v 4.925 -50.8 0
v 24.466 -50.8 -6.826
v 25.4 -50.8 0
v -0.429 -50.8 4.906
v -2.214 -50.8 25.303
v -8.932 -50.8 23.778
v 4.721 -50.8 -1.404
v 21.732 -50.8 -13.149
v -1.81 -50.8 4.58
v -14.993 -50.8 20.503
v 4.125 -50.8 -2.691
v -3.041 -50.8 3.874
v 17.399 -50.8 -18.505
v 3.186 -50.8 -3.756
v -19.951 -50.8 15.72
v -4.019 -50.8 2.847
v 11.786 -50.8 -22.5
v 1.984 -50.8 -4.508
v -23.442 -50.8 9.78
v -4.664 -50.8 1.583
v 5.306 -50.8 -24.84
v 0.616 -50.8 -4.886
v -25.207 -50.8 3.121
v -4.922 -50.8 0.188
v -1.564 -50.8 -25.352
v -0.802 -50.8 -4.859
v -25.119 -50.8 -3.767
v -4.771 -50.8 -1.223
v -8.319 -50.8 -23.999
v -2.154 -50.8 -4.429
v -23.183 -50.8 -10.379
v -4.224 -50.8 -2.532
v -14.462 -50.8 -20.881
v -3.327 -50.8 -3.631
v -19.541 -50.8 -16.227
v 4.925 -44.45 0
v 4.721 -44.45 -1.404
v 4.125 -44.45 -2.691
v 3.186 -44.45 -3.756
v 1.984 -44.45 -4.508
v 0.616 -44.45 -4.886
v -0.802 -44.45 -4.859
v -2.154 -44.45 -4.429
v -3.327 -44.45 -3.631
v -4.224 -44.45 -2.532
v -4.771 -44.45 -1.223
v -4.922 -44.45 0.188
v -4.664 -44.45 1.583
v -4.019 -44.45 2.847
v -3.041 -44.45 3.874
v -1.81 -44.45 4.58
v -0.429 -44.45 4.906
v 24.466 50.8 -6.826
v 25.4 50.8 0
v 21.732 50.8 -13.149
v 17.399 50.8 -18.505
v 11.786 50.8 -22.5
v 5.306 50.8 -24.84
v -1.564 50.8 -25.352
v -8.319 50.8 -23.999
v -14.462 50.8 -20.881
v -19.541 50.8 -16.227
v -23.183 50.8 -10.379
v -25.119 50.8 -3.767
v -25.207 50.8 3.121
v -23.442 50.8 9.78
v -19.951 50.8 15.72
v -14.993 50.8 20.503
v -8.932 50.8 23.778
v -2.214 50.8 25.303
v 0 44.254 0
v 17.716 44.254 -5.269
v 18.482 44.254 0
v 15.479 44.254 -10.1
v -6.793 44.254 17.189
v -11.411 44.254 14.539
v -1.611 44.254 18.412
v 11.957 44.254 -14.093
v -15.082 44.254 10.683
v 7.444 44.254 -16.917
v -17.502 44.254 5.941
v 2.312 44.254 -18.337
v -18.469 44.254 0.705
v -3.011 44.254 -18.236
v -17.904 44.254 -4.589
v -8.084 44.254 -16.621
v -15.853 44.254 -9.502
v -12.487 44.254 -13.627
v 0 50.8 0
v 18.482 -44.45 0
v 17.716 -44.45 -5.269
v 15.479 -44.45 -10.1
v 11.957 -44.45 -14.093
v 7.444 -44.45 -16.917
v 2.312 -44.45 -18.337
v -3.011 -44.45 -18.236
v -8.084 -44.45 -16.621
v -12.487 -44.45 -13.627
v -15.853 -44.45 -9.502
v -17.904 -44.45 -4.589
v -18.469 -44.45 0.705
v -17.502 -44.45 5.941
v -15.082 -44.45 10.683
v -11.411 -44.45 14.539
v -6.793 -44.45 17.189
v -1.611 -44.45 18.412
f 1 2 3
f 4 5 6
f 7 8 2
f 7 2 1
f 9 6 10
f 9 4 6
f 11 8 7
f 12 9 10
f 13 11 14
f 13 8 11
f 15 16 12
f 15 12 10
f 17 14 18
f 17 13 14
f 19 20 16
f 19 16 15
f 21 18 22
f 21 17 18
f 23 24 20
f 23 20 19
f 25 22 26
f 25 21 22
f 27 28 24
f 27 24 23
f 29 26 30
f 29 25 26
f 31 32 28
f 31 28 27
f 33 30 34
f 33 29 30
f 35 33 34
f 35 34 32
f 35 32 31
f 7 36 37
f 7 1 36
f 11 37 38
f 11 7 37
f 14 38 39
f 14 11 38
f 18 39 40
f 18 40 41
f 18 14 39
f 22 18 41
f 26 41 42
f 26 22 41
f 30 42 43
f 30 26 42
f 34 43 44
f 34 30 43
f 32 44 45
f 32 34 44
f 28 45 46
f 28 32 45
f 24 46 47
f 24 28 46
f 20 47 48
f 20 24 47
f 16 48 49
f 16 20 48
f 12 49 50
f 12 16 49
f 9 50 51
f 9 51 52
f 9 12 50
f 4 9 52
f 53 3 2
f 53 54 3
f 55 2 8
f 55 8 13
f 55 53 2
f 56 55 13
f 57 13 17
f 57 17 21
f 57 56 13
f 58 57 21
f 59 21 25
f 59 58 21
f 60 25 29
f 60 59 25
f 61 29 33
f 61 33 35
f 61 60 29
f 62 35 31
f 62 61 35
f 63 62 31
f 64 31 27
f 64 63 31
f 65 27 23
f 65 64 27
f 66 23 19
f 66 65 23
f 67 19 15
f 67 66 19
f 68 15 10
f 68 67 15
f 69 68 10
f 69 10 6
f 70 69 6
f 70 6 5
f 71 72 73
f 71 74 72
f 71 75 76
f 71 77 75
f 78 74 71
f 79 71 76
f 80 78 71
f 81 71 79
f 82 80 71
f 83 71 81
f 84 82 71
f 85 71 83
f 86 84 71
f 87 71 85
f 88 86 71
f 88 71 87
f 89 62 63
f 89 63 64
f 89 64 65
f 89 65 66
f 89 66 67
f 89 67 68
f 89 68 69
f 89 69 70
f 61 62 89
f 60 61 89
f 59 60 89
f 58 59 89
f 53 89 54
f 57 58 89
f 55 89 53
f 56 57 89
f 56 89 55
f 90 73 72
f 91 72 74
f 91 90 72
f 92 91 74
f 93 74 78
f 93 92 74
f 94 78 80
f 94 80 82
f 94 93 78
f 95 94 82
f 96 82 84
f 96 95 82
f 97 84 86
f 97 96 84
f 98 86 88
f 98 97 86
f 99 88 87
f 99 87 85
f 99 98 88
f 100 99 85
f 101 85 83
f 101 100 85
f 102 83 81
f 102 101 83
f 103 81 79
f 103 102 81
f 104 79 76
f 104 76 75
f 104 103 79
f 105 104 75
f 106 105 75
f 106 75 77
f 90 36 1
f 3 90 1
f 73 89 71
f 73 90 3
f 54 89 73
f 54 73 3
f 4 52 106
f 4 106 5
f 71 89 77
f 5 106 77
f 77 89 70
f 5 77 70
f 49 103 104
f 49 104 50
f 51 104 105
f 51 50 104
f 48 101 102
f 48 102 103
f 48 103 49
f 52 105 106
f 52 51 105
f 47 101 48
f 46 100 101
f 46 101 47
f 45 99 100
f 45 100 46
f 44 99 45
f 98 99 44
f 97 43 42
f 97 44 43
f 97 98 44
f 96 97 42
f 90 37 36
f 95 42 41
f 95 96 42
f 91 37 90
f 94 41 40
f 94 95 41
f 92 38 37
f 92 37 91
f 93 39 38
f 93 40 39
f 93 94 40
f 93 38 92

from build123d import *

# Parameters (mm, degrees)
F1_ANGLE = 265


with BuildPart() as f1:
    # F0 (on Top) → F1 (revolve)
    with BuildSketch(Plane.XY):
        Polygon((25.4, 50.8), (0, 50.8), (0, 44.253774), (18.482406, 44.253774), (18.482406, -44.45), (25.4, -44.45), align=None)
        Polygon((25.4, -50.8), (25.4, -44.45), (18.482406, -44.45), (4.925116, -44.45), (4.925116, -50.8), align=None)
    revolve(axis=Axis((0, 25.4, 0), (0, 1, 0)), revolution_arc=F1_ANGLE)


solid = f1.part
